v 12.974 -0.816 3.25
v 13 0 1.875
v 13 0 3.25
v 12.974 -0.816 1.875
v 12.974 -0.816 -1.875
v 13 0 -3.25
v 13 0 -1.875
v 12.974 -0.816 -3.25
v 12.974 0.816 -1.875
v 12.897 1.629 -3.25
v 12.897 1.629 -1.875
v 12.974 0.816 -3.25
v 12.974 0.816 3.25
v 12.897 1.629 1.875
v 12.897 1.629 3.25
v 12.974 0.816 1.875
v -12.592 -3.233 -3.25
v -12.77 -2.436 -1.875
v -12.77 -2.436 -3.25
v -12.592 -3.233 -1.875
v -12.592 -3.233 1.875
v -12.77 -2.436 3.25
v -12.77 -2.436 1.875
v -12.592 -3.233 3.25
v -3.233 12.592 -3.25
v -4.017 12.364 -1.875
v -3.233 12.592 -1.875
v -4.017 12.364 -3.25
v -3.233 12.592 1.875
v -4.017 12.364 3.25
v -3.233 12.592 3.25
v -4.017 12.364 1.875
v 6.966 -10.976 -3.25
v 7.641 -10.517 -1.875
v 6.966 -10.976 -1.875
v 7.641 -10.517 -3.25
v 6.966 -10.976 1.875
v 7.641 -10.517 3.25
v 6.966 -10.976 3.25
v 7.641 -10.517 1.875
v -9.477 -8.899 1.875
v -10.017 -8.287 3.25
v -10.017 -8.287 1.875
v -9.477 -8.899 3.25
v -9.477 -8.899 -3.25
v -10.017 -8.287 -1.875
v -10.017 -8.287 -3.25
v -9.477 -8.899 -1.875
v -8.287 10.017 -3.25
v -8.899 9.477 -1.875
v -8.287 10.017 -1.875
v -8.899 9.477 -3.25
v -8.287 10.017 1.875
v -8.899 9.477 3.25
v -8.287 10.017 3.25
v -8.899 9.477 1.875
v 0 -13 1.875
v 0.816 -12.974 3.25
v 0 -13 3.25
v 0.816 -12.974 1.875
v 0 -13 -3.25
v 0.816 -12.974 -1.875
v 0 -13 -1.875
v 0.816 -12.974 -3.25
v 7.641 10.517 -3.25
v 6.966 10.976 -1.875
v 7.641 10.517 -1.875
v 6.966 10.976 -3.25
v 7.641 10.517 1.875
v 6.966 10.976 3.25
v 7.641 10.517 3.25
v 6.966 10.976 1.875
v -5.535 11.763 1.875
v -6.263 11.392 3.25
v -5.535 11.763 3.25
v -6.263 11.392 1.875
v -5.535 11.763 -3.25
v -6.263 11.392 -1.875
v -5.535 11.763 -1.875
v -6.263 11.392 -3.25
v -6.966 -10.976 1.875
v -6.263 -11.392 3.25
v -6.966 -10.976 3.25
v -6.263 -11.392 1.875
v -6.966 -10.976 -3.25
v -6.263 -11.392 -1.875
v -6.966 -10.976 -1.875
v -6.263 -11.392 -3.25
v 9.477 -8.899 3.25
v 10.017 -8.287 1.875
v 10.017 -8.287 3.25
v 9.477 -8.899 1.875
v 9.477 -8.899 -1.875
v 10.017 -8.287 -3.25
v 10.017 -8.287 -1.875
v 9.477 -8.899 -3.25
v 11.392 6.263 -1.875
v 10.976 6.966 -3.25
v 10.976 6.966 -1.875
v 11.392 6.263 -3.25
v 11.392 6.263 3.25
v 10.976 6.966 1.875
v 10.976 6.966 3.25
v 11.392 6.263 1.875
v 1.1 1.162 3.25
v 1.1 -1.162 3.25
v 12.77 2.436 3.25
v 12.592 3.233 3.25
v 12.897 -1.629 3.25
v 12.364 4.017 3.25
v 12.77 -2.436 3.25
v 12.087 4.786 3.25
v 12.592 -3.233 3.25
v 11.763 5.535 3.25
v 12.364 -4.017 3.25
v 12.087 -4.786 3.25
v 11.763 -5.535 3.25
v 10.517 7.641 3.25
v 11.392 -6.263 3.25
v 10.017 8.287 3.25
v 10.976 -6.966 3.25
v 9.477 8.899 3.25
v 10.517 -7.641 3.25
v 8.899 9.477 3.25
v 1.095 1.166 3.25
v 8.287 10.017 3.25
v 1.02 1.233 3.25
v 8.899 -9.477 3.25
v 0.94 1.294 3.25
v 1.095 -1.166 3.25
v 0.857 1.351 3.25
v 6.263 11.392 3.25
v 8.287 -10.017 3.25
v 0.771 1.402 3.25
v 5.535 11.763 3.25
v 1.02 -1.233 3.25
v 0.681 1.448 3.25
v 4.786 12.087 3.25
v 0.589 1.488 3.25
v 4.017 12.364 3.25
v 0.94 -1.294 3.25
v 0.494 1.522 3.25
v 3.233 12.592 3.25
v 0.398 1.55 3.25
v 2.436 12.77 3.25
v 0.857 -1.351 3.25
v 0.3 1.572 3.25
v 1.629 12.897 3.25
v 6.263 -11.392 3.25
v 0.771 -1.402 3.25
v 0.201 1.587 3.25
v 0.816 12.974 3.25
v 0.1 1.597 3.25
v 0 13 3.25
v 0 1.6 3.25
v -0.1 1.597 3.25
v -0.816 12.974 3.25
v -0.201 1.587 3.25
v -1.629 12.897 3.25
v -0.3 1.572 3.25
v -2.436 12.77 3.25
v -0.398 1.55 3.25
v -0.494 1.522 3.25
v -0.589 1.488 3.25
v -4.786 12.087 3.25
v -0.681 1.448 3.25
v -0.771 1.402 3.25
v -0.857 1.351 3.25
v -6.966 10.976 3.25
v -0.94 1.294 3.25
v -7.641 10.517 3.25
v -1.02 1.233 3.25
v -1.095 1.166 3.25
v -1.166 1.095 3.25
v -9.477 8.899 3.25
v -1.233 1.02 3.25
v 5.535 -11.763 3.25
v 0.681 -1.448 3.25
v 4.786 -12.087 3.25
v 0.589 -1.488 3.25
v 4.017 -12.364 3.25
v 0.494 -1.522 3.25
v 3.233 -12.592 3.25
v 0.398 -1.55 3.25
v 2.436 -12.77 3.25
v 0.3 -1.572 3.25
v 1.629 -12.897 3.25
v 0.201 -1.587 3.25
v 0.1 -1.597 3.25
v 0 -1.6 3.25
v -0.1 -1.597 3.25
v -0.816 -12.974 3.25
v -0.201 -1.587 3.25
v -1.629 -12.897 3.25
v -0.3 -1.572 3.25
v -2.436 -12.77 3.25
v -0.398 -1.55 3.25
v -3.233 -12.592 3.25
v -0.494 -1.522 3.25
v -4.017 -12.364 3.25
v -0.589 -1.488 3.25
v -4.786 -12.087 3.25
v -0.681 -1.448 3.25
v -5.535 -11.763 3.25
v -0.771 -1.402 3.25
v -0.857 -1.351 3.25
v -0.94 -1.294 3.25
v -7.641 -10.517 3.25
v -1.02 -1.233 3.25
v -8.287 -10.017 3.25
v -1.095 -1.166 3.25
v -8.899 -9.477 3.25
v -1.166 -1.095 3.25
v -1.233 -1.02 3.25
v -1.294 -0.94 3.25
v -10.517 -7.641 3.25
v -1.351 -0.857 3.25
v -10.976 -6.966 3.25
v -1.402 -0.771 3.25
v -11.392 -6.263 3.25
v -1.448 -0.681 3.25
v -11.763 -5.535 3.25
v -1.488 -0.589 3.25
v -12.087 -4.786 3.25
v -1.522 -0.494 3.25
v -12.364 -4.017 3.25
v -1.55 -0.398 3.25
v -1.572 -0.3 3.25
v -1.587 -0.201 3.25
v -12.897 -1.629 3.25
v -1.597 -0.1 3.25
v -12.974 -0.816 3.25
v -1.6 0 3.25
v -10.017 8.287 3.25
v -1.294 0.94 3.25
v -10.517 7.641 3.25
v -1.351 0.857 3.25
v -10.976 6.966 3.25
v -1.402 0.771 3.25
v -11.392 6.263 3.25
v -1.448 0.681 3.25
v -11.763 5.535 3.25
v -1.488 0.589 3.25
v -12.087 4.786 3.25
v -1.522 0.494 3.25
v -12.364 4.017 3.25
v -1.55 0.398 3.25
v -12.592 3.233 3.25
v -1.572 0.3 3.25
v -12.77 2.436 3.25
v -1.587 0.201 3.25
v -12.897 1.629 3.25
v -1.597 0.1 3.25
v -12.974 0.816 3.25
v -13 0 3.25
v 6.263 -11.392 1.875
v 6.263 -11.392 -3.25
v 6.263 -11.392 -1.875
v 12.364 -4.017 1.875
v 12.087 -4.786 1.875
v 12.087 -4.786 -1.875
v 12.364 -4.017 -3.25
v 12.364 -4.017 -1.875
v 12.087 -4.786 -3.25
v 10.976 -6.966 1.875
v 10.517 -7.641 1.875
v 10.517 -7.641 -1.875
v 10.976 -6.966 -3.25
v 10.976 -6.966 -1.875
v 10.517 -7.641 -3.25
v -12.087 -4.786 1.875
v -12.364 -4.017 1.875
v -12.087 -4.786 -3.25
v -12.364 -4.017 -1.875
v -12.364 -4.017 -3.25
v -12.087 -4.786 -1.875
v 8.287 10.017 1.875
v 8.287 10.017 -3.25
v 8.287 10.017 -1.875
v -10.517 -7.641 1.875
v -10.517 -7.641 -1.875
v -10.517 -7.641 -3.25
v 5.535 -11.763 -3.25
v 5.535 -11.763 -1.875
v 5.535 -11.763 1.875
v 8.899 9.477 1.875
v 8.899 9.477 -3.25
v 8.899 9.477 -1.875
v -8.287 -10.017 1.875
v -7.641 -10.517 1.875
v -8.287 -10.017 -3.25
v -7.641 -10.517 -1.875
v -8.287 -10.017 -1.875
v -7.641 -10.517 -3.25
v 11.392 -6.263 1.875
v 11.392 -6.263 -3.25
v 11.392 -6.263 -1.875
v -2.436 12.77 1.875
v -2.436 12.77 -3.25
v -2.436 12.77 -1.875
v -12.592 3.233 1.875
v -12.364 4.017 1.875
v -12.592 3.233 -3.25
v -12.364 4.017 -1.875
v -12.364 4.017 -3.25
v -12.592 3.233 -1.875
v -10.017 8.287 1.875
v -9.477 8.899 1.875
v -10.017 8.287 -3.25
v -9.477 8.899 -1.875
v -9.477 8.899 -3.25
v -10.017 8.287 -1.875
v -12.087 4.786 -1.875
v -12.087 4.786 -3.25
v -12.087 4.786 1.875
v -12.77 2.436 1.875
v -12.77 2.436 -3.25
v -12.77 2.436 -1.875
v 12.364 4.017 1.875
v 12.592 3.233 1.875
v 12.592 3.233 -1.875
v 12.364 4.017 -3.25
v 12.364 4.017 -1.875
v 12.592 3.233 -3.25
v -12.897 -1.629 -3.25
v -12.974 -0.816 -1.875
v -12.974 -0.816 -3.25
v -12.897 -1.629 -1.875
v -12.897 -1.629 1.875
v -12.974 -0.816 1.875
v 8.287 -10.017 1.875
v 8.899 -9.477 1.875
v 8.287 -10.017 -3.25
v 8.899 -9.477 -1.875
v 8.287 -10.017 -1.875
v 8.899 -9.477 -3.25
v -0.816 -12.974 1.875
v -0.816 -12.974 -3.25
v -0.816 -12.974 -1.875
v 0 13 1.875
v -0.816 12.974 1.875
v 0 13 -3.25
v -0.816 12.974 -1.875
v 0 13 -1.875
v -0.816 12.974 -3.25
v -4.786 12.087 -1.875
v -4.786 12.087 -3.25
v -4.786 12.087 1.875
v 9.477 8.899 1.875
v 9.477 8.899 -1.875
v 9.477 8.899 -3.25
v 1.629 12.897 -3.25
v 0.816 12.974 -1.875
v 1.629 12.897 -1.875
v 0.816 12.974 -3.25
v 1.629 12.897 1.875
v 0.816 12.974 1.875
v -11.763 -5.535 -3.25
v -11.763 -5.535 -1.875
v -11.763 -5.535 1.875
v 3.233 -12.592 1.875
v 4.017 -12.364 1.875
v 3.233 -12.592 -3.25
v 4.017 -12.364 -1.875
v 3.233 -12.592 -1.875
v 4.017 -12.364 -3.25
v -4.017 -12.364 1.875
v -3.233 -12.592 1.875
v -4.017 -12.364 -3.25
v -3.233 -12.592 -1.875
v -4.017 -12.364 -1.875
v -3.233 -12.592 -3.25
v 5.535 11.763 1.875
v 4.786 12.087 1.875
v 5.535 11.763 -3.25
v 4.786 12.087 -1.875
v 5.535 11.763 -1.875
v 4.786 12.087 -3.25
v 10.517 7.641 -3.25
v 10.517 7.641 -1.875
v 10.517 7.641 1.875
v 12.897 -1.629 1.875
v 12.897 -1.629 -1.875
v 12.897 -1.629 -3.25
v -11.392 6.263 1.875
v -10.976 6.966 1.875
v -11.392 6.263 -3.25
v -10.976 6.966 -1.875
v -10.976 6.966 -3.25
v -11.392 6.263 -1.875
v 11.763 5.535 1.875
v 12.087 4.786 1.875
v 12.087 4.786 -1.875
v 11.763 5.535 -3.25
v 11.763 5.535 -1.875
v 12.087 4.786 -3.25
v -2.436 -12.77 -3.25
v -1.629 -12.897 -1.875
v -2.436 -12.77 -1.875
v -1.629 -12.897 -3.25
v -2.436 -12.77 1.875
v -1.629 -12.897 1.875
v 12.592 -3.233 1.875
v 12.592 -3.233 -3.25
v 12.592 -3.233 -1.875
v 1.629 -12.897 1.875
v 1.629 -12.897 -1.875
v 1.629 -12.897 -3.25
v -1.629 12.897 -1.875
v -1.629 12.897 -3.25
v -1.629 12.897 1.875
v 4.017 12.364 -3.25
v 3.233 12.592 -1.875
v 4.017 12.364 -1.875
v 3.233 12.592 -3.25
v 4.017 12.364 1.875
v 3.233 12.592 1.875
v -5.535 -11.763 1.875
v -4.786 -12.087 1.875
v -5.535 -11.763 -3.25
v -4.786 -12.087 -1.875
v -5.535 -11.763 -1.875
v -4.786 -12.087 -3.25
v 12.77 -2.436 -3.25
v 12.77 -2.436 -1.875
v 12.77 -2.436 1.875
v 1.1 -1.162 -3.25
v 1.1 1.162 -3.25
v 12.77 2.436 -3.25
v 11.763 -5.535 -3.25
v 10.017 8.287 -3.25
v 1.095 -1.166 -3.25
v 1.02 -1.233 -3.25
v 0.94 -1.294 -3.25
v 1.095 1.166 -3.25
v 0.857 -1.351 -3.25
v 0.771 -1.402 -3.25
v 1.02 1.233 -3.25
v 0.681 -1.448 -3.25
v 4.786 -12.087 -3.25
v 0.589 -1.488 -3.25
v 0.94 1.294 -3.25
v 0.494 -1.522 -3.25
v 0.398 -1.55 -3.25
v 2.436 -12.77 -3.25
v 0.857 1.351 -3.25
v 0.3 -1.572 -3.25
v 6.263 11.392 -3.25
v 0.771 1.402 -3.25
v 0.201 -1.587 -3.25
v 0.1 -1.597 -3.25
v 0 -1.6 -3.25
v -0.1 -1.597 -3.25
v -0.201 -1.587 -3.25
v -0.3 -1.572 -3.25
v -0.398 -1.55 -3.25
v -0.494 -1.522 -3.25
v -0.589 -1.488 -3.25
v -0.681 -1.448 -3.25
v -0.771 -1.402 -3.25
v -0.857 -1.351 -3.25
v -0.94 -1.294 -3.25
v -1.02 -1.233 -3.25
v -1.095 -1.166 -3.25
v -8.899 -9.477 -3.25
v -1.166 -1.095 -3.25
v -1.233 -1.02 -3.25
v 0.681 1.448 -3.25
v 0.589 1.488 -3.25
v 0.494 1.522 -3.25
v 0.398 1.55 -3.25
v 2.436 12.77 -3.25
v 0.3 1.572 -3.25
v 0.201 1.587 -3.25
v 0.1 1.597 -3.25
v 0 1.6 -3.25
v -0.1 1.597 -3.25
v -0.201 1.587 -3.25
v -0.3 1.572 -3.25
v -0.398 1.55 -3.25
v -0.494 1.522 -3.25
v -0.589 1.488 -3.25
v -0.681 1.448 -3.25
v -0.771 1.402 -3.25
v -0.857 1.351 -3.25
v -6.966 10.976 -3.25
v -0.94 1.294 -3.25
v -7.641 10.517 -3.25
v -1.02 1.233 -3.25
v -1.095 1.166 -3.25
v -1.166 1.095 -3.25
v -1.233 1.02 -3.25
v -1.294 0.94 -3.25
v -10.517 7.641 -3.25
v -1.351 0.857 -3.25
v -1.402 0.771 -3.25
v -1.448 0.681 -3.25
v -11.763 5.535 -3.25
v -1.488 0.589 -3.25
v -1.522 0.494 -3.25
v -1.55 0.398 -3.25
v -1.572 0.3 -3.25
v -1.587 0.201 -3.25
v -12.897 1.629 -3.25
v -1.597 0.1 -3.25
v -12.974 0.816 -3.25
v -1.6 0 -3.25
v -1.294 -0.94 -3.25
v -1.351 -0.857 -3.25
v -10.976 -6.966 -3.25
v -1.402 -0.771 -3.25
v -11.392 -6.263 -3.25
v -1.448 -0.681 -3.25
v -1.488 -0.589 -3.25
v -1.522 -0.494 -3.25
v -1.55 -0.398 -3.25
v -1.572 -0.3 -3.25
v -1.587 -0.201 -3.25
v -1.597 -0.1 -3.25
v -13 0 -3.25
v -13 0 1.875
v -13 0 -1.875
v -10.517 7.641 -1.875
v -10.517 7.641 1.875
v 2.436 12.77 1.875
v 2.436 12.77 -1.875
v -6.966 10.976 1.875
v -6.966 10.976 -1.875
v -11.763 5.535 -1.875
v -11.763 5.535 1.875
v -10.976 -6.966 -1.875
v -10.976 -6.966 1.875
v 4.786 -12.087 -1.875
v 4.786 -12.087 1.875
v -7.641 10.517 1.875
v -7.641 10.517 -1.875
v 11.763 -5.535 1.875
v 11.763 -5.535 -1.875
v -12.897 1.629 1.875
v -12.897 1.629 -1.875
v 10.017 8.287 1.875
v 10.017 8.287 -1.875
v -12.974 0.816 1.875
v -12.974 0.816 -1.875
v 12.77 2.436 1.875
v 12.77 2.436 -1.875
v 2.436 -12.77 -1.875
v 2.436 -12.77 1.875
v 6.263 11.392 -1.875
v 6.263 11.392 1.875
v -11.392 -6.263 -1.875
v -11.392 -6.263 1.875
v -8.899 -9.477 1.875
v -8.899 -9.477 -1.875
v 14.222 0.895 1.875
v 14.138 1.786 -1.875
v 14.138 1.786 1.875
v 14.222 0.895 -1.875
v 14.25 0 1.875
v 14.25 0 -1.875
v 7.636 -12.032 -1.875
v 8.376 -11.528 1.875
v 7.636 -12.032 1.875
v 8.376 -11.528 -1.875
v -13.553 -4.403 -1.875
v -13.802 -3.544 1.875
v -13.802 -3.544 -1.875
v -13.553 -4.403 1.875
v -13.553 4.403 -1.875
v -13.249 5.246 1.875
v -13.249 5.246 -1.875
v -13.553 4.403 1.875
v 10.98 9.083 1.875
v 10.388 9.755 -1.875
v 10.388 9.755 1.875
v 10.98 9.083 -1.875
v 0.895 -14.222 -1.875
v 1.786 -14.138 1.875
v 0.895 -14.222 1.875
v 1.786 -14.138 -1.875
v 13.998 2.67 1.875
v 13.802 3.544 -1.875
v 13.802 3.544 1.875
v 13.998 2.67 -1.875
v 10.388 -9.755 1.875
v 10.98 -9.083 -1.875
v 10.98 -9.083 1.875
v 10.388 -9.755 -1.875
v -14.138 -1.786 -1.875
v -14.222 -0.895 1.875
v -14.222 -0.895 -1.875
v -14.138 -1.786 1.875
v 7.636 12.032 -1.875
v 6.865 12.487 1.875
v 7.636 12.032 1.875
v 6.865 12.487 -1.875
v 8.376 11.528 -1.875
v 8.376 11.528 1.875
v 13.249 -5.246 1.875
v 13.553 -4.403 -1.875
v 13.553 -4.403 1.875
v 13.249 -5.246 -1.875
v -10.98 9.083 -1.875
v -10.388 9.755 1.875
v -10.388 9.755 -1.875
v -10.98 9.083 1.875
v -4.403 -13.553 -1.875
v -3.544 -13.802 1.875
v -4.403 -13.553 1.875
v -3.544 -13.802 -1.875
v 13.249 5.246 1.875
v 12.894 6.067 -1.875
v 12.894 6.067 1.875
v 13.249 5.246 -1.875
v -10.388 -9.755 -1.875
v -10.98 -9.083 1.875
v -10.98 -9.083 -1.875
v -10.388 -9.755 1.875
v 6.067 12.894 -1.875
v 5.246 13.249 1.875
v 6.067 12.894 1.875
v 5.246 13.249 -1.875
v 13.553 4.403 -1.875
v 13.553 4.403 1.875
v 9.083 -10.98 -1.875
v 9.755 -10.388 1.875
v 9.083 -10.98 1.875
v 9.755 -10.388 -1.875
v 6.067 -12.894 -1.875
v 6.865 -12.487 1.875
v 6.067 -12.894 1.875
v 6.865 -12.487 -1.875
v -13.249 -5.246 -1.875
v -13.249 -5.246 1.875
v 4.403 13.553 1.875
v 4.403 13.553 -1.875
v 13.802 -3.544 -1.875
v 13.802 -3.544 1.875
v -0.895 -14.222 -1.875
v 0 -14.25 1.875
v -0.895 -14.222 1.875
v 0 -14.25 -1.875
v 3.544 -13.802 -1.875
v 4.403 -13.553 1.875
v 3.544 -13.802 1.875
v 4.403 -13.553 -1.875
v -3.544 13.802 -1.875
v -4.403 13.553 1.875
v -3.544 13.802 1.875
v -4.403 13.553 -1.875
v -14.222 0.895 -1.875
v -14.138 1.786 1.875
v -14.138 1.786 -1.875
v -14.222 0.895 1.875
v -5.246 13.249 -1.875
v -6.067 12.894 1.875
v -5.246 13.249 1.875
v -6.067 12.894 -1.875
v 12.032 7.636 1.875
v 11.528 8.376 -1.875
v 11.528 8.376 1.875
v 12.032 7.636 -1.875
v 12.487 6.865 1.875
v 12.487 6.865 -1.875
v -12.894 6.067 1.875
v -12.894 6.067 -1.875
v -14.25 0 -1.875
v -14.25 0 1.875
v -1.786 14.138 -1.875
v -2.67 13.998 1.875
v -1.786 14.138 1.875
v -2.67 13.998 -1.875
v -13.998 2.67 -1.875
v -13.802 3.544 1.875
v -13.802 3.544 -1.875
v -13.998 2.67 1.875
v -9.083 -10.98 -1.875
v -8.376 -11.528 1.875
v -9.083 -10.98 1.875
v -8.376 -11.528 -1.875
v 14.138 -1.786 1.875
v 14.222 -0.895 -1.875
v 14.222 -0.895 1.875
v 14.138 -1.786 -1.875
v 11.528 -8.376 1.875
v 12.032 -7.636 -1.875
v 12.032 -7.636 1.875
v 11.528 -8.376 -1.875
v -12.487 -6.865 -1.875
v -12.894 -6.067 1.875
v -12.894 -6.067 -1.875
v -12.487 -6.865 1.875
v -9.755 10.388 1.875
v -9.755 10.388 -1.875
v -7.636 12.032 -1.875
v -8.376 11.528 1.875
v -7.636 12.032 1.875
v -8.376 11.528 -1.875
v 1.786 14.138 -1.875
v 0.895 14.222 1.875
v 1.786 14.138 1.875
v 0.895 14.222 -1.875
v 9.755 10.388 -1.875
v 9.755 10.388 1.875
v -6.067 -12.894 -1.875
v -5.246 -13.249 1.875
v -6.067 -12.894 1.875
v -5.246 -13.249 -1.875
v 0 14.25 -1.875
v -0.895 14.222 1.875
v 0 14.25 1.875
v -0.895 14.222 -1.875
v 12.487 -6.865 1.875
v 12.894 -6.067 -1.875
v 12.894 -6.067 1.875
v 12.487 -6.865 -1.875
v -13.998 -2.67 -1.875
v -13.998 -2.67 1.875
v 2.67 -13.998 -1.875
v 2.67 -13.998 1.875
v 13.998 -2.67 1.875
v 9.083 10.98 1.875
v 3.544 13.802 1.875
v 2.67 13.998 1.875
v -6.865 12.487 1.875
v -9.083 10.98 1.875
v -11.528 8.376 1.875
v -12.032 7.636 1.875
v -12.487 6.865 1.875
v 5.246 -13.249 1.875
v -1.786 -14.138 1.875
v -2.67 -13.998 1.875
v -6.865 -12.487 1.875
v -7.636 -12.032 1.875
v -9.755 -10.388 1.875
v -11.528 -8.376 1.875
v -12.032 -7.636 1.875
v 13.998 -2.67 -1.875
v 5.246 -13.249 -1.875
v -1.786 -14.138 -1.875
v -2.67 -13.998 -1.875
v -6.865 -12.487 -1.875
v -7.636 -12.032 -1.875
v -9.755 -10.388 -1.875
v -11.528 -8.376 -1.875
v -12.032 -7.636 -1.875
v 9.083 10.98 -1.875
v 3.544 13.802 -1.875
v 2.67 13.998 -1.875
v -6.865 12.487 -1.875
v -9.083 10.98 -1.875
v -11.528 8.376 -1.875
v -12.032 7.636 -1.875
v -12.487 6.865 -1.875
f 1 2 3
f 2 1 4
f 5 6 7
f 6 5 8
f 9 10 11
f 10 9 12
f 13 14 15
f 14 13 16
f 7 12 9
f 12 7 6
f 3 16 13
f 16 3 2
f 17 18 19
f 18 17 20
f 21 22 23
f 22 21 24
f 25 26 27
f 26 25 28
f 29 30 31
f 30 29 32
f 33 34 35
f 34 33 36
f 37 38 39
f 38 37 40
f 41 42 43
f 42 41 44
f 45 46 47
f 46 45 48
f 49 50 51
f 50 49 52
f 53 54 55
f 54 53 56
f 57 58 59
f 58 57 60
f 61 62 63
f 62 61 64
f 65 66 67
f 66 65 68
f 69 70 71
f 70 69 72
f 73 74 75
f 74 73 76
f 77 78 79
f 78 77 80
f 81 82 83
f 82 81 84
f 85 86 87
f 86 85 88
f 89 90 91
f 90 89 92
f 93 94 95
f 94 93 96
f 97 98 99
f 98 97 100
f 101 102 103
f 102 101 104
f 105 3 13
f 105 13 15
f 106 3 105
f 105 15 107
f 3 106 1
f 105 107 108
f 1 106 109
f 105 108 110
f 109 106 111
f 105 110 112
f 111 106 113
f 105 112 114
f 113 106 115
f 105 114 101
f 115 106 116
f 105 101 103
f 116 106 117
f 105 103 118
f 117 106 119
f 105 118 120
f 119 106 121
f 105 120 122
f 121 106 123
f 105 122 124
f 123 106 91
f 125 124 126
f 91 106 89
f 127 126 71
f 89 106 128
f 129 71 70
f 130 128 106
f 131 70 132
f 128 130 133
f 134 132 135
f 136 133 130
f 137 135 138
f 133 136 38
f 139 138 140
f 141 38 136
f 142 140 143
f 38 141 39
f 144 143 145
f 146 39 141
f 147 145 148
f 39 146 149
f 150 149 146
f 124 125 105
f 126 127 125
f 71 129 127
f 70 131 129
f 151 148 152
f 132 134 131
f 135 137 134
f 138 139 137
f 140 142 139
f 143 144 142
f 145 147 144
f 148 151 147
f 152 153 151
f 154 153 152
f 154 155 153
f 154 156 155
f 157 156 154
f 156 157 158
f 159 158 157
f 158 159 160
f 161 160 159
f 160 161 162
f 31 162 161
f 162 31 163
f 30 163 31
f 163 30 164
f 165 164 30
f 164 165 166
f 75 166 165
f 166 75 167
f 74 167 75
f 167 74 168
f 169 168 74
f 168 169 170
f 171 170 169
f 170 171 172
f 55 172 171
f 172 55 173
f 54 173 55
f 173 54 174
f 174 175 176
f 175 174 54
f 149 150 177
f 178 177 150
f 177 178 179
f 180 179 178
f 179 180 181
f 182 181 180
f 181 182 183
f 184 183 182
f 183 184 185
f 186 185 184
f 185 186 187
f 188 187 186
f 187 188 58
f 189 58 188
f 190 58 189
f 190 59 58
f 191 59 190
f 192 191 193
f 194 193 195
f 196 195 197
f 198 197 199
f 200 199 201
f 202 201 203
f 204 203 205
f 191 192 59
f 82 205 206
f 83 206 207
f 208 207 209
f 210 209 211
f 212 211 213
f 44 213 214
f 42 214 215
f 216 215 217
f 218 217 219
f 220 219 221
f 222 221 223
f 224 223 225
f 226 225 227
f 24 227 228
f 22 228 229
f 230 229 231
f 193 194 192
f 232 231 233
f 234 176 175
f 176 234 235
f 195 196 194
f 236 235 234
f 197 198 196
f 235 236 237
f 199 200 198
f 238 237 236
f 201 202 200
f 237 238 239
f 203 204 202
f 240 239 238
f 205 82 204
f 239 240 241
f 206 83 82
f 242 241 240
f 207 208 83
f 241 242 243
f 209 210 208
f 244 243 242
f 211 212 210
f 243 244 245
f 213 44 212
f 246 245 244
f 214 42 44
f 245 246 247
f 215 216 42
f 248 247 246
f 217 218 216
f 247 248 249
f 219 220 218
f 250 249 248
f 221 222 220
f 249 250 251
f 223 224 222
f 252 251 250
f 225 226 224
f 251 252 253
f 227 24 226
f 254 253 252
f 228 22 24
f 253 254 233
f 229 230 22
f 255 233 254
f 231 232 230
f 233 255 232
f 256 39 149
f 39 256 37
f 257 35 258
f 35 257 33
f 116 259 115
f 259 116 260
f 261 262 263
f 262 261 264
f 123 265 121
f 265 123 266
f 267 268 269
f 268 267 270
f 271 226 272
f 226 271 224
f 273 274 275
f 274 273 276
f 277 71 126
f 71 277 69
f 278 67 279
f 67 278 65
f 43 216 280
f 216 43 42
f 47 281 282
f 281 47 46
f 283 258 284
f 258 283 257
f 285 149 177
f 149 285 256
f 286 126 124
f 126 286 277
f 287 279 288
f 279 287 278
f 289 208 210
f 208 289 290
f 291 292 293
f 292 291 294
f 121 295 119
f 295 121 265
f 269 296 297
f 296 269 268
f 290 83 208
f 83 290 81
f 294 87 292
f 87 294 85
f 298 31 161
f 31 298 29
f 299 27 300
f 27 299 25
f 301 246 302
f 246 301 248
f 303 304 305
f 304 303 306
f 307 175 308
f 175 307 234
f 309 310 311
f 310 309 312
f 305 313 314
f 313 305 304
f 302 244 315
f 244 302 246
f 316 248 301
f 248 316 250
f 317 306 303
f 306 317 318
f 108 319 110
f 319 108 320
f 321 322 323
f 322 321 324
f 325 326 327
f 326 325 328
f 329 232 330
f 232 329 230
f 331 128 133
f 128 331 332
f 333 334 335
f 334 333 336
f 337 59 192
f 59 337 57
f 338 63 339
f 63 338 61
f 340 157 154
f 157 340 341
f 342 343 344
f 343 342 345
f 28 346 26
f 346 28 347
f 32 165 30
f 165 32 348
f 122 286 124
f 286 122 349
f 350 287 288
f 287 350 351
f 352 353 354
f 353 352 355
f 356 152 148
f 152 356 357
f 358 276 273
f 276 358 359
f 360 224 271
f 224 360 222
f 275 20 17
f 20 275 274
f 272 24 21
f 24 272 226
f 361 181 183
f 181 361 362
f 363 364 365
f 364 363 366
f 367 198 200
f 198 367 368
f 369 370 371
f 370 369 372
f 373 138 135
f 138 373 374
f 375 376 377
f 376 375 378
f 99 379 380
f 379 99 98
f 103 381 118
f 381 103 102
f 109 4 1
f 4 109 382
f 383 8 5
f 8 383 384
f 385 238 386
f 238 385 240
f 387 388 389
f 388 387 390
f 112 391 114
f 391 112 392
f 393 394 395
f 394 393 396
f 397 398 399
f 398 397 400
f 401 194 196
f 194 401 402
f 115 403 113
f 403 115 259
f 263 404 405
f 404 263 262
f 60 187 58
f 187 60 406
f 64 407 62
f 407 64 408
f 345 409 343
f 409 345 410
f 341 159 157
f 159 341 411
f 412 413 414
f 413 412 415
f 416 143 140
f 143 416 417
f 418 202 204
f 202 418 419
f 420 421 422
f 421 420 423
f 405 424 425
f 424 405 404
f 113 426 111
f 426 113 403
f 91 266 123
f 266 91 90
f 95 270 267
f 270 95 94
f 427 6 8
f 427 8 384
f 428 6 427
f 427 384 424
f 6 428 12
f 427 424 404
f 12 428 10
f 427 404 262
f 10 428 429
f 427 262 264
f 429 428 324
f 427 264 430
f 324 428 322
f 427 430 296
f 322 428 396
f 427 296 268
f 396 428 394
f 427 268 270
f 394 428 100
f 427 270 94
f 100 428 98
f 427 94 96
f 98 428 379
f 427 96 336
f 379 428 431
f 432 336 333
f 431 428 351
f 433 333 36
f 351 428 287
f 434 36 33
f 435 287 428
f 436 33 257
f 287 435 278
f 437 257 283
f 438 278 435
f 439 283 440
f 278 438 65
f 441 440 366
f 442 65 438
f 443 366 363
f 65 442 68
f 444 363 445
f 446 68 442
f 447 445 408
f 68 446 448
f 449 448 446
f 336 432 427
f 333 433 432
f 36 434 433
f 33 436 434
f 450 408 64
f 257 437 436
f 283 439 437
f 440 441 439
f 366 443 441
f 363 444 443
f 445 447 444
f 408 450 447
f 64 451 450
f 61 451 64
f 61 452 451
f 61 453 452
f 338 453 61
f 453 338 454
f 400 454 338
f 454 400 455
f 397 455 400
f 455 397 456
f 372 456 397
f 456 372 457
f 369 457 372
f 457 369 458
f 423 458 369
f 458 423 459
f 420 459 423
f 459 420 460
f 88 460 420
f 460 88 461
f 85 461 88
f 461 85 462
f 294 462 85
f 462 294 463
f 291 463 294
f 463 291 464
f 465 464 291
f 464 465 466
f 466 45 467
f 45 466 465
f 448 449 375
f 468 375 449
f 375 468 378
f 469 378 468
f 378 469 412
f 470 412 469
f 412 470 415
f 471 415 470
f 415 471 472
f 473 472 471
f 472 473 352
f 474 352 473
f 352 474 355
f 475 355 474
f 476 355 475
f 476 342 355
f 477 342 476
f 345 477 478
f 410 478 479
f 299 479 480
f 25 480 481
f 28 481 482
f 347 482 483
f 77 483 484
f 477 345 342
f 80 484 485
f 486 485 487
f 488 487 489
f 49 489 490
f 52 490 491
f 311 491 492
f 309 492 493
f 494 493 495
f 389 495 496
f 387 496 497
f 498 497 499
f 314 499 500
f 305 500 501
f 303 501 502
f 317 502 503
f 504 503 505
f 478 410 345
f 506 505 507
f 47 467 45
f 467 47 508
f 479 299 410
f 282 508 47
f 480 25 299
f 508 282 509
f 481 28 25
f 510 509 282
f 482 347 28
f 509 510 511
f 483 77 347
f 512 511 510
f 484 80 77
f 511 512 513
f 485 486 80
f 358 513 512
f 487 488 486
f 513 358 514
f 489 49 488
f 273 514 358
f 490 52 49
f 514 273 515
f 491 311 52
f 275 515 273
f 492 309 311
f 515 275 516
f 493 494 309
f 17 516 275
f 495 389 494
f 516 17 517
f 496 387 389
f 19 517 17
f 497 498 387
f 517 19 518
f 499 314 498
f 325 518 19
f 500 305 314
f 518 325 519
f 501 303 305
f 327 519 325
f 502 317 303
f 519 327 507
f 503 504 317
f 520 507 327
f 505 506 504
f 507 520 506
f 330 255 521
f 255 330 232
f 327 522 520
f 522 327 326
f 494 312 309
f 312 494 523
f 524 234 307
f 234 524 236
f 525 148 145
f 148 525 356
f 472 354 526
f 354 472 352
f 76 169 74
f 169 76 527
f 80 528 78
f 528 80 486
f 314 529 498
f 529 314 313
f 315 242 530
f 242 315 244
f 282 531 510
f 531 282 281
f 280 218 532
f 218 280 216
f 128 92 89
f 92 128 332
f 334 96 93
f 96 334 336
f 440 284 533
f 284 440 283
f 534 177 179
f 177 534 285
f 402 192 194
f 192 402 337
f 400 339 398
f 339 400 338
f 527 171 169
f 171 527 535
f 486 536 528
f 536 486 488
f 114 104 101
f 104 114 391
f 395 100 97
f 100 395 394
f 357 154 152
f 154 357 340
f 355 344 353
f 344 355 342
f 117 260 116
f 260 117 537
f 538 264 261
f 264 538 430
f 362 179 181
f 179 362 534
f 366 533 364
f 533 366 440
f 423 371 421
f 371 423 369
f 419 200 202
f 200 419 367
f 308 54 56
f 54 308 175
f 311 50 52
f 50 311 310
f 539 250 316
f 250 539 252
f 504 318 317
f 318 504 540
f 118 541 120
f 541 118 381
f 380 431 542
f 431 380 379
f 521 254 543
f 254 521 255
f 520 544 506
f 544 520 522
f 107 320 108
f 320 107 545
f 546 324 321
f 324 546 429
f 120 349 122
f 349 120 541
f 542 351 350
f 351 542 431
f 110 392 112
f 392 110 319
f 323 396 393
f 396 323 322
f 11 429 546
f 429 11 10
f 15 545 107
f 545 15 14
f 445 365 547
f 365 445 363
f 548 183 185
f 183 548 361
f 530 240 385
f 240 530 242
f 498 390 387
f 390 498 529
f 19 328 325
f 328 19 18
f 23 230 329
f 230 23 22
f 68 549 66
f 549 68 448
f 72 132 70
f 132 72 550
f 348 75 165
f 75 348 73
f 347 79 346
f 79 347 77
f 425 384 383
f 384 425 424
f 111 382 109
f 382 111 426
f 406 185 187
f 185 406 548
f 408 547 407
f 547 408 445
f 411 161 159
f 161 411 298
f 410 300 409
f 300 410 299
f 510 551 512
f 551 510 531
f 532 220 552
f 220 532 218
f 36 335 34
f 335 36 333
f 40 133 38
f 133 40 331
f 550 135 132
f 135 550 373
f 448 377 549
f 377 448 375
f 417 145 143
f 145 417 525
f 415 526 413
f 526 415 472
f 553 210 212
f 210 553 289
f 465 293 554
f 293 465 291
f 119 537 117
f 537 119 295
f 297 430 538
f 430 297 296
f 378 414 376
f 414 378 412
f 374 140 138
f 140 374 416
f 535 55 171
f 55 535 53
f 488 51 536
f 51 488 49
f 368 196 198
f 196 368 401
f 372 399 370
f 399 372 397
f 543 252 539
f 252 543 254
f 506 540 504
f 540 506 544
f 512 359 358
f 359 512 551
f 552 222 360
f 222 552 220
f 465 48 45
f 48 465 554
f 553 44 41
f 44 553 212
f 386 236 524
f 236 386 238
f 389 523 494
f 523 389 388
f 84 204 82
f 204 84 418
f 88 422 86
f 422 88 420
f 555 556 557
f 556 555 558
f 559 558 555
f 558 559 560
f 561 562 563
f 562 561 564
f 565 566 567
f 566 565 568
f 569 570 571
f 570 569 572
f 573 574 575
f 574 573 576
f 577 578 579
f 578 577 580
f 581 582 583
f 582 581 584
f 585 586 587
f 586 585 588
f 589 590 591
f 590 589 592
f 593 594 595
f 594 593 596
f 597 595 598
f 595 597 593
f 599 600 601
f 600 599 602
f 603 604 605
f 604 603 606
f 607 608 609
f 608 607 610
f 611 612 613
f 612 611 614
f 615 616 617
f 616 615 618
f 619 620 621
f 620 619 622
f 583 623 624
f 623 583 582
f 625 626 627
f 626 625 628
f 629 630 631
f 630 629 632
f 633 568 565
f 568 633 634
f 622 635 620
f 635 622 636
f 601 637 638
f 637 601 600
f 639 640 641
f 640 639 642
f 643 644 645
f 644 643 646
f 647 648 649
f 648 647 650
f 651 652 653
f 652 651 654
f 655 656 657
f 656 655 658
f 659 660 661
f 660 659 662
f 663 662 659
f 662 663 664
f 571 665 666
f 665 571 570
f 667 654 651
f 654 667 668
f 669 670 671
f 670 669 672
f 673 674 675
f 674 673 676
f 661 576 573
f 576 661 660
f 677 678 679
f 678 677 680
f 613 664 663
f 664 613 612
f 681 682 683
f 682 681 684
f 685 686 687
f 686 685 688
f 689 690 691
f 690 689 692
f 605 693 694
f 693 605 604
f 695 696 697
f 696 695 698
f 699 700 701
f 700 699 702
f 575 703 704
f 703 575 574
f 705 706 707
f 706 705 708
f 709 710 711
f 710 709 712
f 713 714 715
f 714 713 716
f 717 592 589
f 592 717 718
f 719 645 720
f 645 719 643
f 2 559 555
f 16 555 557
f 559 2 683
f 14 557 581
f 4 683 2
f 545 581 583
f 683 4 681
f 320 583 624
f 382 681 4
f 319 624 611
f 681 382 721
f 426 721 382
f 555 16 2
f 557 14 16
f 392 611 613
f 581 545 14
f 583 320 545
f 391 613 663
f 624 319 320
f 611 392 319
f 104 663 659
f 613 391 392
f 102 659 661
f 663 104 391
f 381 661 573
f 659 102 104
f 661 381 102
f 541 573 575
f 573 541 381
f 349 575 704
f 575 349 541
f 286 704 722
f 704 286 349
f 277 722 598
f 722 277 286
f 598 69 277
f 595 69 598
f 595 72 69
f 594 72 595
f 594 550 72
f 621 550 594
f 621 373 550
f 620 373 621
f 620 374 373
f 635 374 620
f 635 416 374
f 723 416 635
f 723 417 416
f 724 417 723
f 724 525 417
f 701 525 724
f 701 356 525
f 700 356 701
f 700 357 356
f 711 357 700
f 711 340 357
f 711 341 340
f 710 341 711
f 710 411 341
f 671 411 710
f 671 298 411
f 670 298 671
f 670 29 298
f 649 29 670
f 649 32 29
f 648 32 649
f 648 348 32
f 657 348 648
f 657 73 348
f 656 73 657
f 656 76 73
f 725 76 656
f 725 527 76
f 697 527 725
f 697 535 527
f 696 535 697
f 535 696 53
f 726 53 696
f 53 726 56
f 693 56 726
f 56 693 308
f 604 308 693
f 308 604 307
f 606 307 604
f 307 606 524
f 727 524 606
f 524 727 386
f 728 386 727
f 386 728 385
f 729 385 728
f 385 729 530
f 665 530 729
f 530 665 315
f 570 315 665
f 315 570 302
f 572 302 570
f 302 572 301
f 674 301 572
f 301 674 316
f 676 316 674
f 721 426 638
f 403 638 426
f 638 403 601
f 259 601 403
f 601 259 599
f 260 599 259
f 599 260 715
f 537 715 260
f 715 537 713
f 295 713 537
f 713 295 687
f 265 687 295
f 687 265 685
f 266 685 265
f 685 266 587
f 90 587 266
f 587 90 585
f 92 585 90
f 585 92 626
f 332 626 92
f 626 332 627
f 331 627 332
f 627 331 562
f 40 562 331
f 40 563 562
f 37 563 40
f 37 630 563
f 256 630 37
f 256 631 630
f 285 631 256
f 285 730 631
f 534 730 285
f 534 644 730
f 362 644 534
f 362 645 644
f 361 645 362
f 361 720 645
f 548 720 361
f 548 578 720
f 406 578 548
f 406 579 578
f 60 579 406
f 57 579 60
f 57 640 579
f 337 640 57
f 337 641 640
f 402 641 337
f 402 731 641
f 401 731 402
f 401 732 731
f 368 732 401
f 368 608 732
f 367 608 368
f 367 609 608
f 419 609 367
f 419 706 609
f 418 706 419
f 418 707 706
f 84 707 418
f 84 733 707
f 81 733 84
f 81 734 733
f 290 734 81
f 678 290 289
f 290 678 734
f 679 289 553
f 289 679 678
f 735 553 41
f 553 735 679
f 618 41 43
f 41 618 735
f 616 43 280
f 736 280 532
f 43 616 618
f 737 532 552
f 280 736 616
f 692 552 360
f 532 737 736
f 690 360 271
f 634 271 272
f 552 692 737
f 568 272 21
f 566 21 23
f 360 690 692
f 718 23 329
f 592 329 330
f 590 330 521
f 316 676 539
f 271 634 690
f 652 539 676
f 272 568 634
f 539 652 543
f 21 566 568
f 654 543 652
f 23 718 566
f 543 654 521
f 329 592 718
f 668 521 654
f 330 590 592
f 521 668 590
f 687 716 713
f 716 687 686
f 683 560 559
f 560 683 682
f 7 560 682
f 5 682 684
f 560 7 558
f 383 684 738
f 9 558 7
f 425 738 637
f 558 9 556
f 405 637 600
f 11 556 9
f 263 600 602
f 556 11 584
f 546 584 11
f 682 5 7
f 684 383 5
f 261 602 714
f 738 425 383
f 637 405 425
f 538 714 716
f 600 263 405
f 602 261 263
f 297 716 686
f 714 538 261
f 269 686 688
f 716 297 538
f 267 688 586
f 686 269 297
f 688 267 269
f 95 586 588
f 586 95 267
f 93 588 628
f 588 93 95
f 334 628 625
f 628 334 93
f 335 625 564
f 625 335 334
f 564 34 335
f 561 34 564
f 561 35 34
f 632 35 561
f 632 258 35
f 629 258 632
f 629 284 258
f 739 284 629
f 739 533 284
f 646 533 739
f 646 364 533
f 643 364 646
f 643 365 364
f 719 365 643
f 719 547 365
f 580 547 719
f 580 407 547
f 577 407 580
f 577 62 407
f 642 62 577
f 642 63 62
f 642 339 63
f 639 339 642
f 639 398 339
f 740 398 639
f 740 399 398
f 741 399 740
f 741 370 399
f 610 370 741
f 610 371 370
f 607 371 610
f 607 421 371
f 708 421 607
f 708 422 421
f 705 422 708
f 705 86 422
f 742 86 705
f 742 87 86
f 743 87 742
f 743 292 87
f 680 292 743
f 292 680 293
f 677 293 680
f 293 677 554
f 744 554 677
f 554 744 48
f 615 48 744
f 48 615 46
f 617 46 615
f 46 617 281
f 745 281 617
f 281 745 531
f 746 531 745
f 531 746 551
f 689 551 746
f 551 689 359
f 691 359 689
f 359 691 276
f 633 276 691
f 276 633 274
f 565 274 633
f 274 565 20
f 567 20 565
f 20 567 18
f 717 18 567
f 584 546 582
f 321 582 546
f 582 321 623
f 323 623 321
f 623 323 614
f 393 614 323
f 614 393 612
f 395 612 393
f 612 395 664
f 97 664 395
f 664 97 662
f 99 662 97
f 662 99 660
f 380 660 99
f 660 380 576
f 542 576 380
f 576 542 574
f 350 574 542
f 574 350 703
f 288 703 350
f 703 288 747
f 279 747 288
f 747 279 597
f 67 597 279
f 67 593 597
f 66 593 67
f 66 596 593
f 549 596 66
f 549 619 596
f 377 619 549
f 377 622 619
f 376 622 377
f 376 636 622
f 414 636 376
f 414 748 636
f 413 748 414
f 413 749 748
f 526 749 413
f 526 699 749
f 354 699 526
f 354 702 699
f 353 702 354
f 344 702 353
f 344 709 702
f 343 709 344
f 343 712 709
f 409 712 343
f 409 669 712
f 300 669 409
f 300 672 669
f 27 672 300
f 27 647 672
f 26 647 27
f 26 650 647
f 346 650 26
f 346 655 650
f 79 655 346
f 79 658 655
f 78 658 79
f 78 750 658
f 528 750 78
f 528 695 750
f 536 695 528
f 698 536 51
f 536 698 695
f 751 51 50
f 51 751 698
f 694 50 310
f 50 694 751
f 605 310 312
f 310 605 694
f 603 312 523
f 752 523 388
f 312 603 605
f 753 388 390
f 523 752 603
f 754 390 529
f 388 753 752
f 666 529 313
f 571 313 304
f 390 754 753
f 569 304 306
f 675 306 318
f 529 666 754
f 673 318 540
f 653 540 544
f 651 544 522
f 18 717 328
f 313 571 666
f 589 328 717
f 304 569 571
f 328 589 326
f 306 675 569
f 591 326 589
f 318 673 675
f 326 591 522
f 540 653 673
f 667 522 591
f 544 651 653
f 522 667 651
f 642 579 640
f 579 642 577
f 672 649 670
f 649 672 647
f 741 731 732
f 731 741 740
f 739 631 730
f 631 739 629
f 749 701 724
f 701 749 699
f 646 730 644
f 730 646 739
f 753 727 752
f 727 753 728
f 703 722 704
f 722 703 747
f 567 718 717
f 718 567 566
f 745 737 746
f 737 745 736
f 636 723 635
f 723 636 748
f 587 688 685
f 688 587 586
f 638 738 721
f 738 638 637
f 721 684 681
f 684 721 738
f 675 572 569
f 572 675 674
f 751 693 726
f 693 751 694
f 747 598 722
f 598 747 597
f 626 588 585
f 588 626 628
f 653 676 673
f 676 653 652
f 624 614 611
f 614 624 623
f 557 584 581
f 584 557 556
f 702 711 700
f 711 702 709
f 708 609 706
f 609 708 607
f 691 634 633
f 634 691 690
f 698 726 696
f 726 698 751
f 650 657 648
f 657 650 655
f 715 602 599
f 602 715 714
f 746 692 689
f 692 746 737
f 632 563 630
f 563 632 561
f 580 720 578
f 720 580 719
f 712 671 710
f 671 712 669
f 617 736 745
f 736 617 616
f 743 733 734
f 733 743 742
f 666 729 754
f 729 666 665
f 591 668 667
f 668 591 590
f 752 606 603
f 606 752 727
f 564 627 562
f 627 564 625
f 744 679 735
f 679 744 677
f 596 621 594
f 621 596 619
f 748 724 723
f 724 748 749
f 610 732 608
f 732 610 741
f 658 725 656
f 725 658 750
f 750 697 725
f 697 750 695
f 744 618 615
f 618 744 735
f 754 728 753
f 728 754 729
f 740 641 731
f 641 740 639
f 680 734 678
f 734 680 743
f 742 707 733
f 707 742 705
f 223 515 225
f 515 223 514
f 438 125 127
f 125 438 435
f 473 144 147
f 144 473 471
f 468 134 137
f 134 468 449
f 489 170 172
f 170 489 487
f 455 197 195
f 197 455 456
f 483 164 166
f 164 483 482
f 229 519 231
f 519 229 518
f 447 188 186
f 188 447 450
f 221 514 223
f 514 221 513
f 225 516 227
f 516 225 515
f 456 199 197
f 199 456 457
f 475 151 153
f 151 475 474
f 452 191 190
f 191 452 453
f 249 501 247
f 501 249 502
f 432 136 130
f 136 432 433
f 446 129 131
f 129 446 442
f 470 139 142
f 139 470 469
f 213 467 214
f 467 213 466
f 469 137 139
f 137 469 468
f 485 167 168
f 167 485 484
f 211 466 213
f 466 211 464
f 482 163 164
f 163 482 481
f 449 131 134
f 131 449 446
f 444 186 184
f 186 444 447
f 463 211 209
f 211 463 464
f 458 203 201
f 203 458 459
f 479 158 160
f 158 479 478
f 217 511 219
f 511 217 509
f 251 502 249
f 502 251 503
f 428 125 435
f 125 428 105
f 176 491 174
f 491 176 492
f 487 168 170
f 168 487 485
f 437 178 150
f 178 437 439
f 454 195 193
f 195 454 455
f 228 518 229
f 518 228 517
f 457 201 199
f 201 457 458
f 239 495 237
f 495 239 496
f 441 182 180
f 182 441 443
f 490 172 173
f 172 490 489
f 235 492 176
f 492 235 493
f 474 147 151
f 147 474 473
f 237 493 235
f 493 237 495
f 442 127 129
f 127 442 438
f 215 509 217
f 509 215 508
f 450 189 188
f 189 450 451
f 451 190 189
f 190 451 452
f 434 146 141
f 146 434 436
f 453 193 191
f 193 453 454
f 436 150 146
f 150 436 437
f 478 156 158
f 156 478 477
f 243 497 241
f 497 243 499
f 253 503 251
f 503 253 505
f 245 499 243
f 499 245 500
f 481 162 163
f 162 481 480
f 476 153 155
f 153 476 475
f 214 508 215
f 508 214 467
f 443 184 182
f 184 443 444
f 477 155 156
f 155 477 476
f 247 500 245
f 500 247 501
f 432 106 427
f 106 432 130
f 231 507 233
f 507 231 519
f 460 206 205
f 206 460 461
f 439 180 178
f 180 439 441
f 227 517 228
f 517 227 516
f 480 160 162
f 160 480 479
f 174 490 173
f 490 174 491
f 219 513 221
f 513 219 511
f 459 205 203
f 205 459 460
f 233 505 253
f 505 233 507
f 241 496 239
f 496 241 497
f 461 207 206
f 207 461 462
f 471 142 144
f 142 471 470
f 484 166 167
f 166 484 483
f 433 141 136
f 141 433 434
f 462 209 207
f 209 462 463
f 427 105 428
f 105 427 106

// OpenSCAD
//Ensure circles are nice and round
$fn=100;

//Generate wheel
difference() {
	//Main section
	union() {
		//Inner wheel
		cylinder(r=13, h=6.5, center=true);
		//Wheel rim
		cylinder(r=14.25, h=3.75, center=true);
	}
	//Axel hole
	difference() {
		cylinder(r=1.6, h=10, center=true);
		translate([1.1, -3, -10])
			cube([6, 6, 20]);
	}
	//Alex hole cutout
//	translate([-3.41, -0.5, -10])
//		cube([2, 1, 20]);
}
